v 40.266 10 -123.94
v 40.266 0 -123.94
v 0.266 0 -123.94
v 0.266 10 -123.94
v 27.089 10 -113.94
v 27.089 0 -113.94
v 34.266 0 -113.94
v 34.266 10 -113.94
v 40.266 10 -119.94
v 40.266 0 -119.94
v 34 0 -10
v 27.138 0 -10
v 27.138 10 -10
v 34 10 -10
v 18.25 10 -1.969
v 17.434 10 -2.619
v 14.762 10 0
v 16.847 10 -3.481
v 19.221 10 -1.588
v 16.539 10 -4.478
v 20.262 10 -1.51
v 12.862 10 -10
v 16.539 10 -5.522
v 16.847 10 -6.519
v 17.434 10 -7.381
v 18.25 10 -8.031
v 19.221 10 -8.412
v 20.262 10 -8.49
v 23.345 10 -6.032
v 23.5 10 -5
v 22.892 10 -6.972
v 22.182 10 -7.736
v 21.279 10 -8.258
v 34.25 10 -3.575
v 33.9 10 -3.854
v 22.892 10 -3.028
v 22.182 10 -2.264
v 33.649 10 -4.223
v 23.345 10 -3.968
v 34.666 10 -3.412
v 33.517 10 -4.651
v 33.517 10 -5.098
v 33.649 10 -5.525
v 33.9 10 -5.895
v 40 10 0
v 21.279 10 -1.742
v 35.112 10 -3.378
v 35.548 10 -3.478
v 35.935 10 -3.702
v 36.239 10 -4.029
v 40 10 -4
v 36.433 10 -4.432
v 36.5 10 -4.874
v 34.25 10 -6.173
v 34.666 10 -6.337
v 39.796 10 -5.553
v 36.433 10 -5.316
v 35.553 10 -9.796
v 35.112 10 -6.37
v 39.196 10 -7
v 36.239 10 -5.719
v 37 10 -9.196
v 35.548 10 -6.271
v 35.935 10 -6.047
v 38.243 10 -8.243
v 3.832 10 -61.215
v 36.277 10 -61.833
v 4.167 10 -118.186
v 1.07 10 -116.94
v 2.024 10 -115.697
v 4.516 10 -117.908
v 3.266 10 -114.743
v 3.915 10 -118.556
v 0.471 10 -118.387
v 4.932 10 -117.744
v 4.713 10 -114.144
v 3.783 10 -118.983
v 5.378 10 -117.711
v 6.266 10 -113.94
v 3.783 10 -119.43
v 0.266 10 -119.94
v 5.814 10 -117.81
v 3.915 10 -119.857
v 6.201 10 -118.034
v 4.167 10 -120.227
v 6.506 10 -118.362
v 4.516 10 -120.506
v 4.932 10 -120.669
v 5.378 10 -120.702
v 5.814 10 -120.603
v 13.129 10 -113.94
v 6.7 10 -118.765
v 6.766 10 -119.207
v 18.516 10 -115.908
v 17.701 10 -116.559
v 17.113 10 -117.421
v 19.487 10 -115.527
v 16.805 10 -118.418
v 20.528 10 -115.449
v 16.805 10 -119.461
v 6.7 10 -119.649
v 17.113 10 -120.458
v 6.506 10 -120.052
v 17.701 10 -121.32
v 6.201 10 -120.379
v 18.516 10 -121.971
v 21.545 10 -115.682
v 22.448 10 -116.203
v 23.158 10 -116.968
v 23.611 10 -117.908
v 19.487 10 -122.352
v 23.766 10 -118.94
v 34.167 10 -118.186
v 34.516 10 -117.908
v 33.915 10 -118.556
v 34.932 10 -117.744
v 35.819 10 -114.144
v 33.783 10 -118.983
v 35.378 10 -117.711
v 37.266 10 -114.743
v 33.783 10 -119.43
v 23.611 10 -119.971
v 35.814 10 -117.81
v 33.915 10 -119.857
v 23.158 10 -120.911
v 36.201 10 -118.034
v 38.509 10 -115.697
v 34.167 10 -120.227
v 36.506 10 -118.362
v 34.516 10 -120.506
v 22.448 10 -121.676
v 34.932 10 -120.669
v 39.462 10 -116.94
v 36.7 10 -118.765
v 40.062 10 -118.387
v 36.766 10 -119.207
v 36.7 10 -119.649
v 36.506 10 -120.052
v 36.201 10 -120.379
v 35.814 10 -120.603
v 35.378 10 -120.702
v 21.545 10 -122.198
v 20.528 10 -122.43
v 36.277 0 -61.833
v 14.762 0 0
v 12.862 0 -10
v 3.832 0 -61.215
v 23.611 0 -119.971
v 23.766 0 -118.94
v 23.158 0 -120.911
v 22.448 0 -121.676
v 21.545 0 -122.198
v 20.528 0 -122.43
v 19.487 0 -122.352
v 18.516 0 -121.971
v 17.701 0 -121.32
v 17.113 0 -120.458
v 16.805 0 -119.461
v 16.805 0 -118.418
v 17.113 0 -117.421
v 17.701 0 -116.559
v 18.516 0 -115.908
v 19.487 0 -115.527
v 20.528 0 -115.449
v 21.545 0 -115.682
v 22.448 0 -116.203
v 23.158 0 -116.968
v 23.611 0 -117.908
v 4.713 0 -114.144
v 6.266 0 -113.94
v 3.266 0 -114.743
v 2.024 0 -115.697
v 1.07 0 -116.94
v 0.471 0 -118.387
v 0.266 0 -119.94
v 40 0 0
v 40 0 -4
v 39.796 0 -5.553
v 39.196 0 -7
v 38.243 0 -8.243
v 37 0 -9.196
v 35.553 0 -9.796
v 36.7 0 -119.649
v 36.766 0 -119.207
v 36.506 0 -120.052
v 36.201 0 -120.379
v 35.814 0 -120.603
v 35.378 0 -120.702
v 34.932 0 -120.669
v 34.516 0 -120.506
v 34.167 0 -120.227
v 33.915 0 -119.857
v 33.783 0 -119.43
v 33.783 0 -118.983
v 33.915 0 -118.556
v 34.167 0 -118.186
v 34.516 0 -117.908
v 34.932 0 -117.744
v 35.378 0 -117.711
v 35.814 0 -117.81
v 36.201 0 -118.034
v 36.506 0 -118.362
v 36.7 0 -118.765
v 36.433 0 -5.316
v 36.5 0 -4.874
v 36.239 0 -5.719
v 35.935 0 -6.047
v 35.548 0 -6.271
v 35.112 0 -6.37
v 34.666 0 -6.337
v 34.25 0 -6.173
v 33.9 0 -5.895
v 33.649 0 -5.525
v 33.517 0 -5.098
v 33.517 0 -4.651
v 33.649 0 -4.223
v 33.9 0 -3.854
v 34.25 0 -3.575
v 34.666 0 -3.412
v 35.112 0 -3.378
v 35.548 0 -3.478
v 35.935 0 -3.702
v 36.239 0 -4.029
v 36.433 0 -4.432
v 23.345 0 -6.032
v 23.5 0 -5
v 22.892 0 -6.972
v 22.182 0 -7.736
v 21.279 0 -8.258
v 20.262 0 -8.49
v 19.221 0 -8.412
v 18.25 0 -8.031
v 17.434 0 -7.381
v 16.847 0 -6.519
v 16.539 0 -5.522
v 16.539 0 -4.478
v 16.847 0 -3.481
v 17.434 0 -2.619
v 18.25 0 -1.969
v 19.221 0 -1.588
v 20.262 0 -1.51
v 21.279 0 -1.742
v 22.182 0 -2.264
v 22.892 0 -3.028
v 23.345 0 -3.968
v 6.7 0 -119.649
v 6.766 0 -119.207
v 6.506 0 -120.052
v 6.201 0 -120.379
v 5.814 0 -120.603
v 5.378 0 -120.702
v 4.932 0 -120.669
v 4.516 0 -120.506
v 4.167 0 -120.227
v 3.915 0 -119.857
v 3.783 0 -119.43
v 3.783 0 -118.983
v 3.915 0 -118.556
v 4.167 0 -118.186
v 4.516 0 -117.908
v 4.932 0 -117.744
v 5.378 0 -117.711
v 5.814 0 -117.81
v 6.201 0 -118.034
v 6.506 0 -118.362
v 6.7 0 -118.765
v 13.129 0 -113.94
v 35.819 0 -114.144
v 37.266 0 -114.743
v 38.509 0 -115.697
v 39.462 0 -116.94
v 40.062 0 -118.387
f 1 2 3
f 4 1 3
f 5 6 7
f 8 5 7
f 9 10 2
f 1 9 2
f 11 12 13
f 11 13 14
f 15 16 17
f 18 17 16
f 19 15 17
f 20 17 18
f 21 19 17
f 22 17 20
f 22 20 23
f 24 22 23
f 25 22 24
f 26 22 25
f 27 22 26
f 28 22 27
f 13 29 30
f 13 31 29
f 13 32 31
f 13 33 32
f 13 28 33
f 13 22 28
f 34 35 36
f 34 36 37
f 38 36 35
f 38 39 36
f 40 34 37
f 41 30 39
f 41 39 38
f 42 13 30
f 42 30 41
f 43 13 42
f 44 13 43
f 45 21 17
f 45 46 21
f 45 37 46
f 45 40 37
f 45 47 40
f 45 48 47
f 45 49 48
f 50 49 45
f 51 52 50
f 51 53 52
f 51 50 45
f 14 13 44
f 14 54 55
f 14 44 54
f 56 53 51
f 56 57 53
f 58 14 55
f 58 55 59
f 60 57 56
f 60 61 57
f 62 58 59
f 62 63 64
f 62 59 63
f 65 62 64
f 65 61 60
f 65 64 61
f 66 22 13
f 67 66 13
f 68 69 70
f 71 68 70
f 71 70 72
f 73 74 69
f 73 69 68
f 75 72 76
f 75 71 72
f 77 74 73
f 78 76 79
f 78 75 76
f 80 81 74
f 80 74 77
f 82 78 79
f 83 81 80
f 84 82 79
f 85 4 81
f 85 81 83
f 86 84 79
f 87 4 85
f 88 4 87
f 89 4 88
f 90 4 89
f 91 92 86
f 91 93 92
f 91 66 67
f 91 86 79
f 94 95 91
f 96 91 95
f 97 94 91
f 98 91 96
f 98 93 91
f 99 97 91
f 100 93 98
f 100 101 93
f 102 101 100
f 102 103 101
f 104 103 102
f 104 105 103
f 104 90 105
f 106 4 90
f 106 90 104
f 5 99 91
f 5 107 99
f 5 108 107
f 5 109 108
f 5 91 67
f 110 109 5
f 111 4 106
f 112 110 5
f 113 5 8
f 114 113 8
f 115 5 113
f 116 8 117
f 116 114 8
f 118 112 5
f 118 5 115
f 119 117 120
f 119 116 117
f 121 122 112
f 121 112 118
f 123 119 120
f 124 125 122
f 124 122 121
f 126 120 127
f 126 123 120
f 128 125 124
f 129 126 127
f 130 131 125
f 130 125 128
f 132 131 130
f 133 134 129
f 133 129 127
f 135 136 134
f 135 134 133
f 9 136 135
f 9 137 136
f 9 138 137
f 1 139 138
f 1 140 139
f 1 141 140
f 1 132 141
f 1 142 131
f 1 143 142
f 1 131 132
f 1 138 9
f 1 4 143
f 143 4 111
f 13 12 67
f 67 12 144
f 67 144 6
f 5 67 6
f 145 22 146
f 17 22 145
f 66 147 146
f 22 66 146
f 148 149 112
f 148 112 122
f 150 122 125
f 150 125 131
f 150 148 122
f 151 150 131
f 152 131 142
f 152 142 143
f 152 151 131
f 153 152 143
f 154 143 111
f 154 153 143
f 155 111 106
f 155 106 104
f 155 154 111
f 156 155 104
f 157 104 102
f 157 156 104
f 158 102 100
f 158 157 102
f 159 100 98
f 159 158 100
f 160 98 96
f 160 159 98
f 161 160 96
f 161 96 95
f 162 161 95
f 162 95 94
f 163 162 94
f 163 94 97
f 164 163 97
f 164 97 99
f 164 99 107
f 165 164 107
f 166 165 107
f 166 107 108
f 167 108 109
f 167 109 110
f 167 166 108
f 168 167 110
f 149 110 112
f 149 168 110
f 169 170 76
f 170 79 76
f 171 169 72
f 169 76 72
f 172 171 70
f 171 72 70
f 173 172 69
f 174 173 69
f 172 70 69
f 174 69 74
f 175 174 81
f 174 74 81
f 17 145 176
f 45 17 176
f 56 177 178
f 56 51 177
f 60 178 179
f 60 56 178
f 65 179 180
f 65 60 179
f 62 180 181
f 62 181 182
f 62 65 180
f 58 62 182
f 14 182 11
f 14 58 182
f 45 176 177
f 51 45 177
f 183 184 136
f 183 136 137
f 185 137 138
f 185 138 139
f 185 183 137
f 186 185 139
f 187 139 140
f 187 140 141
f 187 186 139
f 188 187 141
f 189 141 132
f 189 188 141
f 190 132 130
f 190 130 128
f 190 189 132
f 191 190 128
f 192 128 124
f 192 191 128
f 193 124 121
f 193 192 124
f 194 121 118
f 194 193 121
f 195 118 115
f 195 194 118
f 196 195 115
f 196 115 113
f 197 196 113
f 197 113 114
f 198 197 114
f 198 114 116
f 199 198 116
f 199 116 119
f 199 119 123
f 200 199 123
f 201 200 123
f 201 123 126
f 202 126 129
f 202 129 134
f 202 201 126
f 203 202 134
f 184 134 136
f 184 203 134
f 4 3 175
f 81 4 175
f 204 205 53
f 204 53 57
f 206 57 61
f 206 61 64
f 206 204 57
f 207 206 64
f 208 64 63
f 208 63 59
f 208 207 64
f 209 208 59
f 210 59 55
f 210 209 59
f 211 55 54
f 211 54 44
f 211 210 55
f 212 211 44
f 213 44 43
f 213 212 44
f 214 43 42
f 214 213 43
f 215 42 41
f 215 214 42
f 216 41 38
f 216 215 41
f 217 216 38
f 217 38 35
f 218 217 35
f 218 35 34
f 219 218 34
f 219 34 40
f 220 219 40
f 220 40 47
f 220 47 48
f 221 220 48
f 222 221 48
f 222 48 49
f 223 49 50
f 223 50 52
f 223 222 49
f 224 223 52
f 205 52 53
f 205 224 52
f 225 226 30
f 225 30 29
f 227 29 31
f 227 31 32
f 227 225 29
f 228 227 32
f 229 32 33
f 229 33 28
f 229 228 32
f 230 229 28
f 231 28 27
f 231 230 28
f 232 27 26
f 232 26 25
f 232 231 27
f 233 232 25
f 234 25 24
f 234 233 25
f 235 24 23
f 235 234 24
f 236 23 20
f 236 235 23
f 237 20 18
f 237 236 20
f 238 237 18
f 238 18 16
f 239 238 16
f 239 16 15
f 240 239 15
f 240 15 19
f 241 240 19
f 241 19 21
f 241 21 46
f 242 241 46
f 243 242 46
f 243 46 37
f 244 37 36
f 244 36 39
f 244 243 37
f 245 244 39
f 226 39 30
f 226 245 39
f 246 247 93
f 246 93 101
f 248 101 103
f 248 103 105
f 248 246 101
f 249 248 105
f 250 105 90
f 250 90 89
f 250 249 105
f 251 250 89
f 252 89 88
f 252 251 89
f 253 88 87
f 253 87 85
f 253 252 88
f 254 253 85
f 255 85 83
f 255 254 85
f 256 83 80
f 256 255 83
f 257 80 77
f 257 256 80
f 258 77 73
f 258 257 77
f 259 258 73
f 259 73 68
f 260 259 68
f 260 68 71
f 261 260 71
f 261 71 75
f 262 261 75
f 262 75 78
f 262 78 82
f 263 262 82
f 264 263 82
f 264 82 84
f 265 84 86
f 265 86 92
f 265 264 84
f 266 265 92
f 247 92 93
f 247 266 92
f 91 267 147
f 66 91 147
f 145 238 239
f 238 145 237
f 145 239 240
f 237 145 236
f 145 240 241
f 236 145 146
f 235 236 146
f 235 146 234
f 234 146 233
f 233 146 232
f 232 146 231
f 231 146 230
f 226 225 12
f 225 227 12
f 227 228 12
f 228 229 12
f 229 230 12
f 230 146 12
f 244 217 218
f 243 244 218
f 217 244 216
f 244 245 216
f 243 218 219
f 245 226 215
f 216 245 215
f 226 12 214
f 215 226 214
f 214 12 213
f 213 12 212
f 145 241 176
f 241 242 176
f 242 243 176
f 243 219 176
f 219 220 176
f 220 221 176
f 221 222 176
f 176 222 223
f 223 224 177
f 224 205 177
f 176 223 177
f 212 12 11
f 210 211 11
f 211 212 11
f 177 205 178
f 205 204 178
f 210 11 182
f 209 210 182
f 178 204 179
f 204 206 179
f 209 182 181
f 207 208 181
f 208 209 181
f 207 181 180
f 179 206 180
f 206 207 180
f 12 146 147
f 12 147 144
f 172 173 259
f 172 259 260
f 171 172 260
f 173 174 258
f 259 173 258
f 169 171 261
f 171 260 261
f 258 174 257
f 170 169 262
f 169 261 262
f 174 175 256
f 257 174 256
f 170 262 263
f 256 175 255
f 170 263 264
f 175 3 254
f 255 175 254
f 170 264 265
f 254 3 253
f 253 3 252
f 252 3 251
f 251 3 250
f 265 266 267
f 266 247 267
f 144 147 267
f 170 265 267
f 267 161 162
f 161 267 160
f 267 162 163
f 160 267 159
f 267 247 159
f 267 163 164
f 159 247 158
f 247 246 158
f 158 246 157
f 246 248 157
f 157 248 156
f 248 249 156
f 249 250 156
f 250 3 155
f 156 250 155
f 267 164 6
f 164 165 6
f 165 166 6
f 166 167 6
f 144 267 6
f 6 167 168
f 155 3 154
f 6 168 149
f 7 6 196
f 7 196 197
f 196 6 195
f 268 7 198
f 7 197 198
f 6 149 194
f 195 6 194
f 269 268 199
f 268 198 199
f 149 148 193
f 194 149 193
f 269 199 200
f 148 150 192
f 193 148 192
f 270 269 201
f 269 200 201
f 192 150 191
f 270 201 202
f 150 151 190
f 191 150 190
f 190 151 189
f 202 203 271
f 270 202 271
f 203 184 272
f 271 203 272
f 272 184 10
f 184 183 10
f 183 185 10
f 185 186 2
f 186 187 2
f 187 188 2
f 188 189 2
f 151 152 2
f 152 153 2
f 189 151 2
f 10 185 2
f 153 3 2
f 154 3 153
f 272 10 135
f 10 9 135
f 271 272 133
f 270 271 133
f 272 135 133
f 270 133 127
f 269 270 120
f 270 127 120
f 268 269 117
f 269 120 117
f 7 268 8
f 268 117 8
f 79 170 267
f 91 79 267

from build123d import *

# Parameters (mm, degrees)
SKETCH2_R           = 1.5
SKETCH2_R_2         = 3.5
SKETCH2_W           = 40
SKETCH2_H           = 10
BOSS_EXTRUDE1_DEPTH = 10
FILLET1_R           = 6
CUT_EXTRUDE2_DEPTH  = 11


with BuildPart() as part:
    # Sketch2 → Boss-Extrude1 (new body)
    with BuildSketch(Plane(origin=(0, 0, 0), x_dir=(1, 0, 0), z_dir=(0, 1, 0))):
        Polygon((27.08938228, 113.93955974), (13.128576505, 113.93955974), (3.831784068, 61.214829812), (12.862340376, 10), (27.137659624, 10), (36.277195325, 61.83288266), align=None)
        Polygon((0.266236129, 113.93955974), (13.128576505, 113.93955974), (27.08938228, 113.93955974), (40.266236129, 113.93955974), (40.266236129, 123.93955974), (0.266236129, 123.93955974), align=None)
        with Locations((5.266236129, 119.206649777)):
            Circle(SKETCH2_R, mode=Mode.SUBTRACT)
        with Locations((20.266236129, 118.93955974)):
            Circle(SKETCH2_R_2, mode=Mode.SUBTRACT)
        with Locations((35.266236129, 119.206649777)):
            Circle(SKETCH2_R, mode=Mode.SUBTRACT)
        with Locations((20, 5)):
            Rectangle(SKETCH2_W, SKETCH2_H)
        with Locations((35, 4.874301968)):
            Circle(SKETCH2_R, mode=Mode.SUBTRACT)
        with Locations((5, 4.874301968)):
            Circle(SKETCH2_R, mode=Mode.SUBTRACT)
        with Locations((20, 5)):
            Circle(SKETCH2_R_2, mode=Mode.SUBTRACT)
    extrude(amount=BOSS_EXTRUDE1_DEPTH)

    # Fillet1
    fillet1_edges = [part.edges().sort_by_distance(p)[0] for p in [
        (40, 5, -10),
        (0, 5, -10),
        (0.266236129, 5, -113.93955974),
        (40.266236129, 5, -113.93955974),
    ]]
    fillet(fillet1_edges, radius=FILLET1_R)

    # Sketch3 → Cut-Extrude2 (cut, through all)
    with BuildSketch(Plane(origin=(0, 10, 0), x_dir=(1, 0, 0), z_dir=(0, 1, 0))):
        Polygon((14.761999195, 0), (0, 0), (0, 10.134747314), (12.862340376, 10), align=None)
    extrude(amount=-CUT_EXTRUDE2_DEPTH, mode=Mode.SUBTRACT)


solid = part.part
